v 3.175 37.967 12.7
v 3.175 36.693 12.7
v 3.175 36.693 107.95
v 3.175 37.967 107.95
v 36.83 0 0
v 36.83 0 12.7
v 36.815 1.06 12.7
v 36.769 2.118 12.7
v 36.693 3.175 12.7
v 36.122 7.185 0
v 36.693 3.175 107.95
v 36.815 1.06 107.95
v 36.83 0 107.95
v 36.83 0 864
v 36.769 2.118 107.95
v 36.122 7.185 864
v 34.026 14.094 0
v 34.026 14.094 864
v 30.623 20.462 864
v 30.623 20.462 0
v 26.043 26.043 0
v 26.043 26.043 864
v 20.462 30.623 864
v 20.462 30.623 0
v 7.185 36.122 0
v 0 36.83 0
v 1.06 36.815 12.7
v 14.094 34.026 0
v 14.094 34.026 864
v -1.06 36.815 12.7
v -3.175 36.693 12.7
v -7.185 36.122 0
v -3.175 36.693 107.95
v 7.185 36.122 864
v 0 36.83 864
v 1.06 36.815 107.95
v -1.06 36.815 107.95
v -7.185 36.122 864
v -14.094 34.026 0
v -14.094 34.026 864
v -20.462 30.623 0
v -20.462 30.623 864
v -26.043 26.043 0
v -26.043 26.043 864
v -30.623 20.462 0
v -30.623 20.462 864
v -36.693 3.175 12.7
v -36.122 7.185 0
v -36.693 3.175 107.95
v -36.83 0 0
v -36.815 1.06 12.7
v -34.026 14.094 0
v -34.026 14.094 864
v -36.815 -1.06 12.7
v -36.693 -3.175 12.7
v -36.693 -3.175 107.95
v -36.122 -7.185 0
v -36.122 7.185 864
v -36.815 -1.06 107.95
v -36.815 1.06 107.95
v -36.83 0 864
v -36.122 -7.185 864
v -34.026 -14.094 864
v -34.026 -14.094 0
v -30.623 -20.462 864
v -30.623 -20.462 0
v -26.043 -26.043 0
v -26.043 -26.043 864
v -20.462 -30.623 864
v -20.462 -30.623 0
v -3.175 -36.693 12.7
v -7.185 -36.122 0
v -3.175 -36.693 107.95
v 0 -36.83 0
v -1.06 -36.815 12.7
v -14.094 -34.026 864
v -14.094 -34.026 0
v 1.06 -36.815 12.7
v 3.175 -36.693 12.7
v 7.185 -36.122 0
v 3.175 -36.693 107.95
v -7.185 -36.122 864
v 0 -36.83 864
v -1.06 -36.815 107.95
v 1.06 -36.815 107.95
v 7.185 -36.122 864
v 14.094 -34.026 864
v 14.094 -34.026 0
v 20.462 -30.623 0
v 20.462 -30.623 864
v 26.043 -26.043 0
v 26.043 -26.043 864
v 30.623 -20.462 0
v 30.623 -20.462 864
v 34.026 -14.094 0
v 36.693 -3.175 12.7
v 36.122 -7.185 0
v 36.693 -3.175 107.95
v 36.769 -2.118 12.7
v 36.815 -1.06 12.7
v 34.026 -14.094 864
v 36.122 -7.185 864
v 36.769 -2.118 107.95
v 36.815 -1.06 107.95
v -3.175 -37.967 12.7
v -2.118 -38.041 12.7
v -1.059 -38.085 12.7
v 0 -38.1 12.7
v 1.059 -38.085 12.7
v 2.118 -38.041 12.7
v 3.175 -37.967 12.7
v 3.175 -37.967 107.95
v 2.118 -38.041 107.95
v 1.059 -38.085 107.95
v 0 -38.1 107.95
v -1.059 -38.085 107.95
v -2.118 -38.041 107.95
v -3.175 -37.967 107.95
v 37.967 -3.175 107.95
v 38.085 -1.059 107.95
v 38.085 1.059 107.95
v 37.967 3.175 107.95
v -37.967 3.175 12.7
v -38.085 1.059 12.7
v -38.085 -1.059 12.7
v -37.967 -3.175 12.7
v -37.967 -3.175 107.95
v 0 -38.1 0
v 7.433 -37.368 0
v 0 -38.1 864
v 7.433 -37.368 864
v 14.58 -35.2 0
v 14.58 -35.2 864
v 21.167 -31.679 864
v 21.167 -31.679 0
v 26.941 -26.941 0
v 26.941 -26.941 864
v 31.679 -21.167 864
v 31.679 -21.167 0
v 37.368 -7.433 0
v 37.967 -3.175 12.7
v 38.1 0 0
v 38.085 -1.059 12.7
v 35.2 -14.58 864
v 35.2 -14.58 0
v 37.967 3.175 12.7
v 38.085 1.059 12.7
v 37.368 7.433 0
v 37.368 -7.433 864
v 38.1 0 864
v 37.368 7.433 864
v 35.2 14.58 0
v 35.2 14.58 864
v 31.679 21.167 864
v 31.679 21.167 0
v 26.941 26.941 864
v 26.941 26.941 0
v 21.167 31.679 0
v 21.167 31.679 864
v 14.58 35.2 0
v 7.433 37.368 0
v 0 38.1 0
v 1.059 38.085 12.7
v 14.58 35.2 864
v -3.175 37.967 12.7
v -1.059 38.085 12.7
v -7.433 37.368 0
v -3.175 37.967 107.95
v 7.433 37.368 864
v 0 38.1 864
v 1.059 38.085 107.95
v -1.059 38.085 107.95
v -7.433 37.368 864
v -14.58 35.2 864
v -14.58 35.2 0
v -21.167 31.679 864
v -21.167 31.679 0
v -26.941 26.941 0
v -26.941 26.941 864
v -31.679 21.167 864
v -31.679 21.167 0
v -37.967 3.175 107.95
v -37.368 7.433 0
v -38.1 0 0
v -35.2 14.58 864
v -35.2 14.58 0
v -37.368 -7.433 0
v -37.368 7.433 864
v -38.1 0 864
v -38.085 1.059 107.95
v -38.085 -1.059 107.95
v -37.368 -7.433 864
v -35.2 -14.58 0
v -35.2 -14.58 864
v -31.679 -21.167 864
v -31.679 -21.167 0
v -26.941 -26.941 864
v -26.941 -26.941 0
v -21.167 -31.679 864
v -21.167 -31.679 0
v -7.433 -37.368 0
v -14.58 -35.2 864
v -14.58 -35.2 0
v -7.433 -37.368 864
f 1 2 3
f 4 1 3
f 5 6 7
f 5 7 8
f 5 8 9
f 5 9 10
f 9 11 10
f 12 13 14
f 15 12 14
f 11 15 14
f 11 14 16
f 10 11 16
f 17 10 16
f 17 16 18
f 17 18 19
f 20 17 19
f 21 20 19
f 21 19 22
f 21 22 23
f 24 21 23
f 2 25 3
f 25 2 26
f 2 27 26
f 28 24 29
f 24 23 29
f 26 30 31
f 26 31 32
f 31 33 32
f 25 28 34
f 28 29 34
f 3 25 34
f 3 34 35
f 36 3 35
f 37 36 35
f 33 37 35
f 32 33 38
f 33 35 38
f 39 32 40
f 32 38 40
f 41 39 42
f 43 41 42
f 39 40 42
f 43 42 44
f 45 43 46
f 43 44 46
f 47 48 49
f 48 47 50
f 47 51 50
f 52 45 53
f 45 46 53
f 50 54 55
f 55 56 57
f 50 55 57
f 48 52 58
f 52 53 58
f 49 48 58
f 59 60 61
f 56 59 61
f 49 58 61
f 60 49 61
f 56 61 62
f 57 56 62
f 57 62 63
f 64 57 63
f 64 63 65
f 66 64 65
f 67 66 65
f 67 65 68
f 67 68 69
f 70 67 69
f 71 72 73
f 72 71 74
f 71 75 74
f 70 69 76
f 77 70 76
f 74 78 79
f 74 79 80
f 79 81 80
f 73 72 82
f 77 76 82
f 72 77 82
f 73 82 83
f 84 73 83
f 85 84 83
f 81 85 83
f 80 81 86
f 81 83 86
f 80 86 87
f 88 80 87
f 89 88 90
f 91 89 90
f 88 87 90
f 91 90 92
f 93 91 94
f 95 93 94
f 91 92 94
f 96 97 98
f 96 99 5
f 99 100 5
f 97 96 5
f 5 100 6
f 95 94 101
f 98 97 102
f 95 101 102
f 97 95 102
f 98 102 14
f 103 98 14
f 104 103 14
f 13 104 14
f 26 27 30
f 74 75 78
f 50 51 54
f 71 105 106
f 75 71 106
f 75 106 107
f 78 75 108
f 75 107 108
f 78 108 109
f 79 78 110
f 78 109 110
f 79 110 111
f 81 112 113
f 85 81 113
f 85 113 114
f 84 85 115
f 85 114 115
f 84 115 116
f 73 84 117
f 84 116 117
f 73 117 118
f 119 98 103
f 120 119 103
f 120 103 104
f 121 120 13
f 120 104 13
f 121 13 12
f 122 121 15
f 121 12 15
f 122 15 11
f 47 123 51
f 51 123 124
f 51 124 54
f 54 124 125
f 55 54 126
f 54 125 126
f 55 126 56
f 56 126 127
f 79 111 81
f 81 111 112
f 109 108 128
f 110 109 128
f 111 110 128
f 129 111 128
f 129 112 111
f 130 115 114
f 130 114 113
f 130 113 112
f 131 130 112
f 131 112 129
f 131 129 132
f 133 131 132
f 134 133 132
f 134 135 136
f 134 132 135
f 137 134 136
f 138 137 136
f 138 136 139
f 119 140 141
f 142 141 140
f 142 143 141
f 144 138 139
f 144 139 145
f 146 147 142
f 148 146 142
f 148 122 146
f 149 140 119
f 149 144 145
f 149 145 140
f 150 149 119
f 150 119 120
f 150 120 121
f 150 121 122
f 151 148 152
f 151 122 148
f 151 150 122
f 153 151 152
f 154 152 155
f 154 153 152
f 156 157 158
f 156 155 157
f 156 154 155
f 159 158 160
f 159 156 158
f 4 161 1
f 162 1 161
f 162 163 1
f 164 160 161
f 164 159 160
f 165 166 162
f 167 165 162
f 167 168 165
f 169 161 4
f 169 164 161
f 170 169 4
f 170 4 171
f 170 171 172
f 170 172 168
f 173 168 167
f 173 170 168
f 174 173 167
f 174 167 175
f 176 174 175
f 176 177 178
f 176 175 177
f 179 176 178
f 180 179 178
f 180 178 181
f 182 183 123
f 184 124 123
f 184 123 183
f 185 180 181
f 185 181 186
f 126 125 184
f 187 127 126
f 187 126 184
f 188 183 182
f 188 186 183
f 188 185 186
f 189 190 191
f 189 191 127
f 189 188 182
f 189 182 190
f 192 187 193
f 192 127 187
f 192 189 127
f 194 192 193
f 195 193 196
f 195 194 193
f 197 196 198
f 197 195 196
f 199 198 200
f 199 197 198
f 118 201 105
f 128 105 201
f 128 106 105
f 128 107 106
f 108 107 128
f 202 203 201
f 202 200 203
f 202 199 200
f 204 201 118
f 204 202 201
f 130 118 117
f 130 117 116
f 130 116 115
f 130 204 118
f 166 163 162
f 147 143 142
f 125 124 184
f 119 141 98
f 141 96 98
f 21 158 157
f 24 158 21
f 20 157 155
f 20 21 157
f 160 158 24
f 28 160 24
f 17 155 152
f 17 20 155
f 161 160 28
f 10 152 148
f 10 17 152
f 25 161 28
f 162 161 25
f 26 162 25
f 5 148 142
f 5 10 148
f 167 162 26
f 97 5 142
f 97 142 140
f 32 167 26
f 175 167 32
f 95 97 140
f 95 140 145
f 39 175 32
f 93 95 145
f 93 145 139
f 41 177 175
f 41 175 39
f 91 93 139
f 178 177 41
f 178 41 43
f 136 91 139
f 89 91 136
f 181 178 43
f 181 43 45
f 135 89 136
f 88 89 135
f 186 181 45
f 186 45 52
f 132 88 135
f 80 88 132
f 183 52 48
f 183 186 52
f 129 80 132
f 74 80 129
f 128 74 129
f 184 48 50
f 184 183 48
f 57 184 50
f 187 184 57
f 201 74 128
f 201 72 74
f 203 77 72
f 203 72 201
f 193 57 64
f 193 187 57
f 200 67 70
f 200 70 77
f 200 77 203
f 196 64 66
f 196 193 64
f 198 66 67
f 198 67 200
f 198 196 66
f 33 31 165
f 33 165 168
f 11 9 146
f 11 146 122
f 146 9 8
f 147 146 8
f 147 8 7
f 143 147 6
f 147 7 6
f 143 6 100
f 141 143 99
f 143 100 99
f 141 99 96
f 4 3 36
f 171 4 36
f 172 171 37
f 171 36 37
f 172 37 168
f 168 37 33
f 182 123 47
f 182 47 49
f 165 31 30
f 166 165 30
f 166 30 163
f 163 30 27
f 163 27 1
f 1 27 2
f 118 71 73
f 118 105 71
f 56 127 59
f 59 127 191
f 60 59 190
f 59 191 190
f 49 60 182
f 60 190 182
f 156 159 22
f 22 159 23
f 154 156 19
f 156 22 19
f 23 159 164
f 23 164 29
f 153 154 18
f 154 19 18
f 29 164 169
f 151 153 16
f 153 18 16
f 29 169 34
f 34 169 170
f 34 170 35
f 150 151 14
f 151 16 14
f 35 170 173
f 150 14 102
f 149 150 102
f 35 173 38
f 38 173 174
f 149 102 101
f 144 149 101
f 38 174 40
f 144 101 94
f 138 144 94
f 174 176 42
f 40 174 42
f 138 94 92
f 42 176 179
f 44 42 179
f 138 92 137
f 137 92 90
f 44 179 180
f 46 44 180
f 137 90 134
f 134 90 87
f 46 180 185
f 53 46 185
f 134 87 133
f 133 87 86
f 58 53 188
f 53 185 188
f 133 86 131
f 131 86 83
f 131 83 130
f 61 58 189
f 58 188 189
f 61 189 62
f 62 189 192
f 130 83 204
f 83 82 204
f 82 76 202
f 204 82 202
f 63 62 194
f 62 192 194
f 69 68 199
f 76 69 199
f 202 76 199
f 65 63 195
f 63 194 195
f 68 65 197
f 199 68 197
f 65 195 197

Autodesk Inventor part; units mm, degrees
ref_plane "YZ Plane" through (0, 0, 0) normal (1, 0, 0) x (0, 1, 0)
ref_plane "XZ Plane" through (0, 0, 0) normal (0, 1, 0) x (-1, 0, 0)
ref_plane "XY Plane" through (0, 0, 0) normal (0, 0, 1) x (1, 0, 0)
sketch "Sketch1" plane through (0, 0, 0) normal (1, 0, 0) x (0, 1, 0)
  line L0 (0, 0) -> (-38.1, 0)
  line L1 (-38.1, 0) -> (-38.1, 864)
  line L2 (-38.1, 864) -> (0, 864)
  line L3 (0, 864) -> (0, 0)
  dimension "d0" = 38.1
  dimension "d1" = 864
revolve "Revolution1" add sketch "Sketch1" angle 360 about axis through (0, 0, 864) along (0, 0, -1)
sketch "Sketch2" plane through (0, 0, 864) normal (0, 0, 1) x (1, 0, 0)
  circle A0 centre (0, 0) radius 36.83
  circle A1 centre (0, 0) radius 38.1 projected
  dimension "d3" = 1.27
extrude "Extrusion1" cut sketch "Sketch2" against normal through all contours A0
sketch "Sketch3" plane through (0, 0, 0) normal (1, 0, 0) x (0, 1, 0)
  line L0 (0, 0) -> (0, 12.7)
  line L1 (0, 12.7) -> (3.175, 12.7)
  line L2 (3.175, 12.7) -> (3.175, 107.95)
  line L3 (3.175, 107.95) -> (0, 107.95)
  line L4 (0, 12.7) -> (-3.175, 12.7)
  line L5 (-3.175, 12.7) -> (-3.175, 107.95)
  line L6 (-3.175, 107.95) -> (0, 107.95)
  dimension "d6" = 12.7
  dimension "d10" = 3.175
  dimension "d11" = 95.25
  dimension "d12" = 3.175
extrude "Extrusion2" cut sketch "Sketch3" along normal through all both and the other way through all
sketch "Sketch4" plane through (0, 0, 0) normal (0, 1, 0) x (-1, 0, 0)
  line L0 (0, 0) -> (0, 12.7)
  line L1 (0, 12.7) -> (3.175, 12.7)
  line L2 (3.175, 12.7) -> (3.175, 107.95)
  line L3 (3.175, 107.95) -> (0, 107.95)
  line L4 (0, 12.7) -> (-3.175, 12.7)
  line L5 (-3.175, 12.7) -> (-3.175, 107.95)
  line L6 (-3.175, 107.95) -> (0, 107.95)
  dimension "d15" = 12.7
  dimension "d16" = 3.175
  dimension "d17" = 95.25
  dimension "d18" = 3.175
  dimension "d19" = 95.25
extrude "Extrusion3" cut sketch "Sketch4" along normal through all both and the other way through all
properties part number "Body Tube"
